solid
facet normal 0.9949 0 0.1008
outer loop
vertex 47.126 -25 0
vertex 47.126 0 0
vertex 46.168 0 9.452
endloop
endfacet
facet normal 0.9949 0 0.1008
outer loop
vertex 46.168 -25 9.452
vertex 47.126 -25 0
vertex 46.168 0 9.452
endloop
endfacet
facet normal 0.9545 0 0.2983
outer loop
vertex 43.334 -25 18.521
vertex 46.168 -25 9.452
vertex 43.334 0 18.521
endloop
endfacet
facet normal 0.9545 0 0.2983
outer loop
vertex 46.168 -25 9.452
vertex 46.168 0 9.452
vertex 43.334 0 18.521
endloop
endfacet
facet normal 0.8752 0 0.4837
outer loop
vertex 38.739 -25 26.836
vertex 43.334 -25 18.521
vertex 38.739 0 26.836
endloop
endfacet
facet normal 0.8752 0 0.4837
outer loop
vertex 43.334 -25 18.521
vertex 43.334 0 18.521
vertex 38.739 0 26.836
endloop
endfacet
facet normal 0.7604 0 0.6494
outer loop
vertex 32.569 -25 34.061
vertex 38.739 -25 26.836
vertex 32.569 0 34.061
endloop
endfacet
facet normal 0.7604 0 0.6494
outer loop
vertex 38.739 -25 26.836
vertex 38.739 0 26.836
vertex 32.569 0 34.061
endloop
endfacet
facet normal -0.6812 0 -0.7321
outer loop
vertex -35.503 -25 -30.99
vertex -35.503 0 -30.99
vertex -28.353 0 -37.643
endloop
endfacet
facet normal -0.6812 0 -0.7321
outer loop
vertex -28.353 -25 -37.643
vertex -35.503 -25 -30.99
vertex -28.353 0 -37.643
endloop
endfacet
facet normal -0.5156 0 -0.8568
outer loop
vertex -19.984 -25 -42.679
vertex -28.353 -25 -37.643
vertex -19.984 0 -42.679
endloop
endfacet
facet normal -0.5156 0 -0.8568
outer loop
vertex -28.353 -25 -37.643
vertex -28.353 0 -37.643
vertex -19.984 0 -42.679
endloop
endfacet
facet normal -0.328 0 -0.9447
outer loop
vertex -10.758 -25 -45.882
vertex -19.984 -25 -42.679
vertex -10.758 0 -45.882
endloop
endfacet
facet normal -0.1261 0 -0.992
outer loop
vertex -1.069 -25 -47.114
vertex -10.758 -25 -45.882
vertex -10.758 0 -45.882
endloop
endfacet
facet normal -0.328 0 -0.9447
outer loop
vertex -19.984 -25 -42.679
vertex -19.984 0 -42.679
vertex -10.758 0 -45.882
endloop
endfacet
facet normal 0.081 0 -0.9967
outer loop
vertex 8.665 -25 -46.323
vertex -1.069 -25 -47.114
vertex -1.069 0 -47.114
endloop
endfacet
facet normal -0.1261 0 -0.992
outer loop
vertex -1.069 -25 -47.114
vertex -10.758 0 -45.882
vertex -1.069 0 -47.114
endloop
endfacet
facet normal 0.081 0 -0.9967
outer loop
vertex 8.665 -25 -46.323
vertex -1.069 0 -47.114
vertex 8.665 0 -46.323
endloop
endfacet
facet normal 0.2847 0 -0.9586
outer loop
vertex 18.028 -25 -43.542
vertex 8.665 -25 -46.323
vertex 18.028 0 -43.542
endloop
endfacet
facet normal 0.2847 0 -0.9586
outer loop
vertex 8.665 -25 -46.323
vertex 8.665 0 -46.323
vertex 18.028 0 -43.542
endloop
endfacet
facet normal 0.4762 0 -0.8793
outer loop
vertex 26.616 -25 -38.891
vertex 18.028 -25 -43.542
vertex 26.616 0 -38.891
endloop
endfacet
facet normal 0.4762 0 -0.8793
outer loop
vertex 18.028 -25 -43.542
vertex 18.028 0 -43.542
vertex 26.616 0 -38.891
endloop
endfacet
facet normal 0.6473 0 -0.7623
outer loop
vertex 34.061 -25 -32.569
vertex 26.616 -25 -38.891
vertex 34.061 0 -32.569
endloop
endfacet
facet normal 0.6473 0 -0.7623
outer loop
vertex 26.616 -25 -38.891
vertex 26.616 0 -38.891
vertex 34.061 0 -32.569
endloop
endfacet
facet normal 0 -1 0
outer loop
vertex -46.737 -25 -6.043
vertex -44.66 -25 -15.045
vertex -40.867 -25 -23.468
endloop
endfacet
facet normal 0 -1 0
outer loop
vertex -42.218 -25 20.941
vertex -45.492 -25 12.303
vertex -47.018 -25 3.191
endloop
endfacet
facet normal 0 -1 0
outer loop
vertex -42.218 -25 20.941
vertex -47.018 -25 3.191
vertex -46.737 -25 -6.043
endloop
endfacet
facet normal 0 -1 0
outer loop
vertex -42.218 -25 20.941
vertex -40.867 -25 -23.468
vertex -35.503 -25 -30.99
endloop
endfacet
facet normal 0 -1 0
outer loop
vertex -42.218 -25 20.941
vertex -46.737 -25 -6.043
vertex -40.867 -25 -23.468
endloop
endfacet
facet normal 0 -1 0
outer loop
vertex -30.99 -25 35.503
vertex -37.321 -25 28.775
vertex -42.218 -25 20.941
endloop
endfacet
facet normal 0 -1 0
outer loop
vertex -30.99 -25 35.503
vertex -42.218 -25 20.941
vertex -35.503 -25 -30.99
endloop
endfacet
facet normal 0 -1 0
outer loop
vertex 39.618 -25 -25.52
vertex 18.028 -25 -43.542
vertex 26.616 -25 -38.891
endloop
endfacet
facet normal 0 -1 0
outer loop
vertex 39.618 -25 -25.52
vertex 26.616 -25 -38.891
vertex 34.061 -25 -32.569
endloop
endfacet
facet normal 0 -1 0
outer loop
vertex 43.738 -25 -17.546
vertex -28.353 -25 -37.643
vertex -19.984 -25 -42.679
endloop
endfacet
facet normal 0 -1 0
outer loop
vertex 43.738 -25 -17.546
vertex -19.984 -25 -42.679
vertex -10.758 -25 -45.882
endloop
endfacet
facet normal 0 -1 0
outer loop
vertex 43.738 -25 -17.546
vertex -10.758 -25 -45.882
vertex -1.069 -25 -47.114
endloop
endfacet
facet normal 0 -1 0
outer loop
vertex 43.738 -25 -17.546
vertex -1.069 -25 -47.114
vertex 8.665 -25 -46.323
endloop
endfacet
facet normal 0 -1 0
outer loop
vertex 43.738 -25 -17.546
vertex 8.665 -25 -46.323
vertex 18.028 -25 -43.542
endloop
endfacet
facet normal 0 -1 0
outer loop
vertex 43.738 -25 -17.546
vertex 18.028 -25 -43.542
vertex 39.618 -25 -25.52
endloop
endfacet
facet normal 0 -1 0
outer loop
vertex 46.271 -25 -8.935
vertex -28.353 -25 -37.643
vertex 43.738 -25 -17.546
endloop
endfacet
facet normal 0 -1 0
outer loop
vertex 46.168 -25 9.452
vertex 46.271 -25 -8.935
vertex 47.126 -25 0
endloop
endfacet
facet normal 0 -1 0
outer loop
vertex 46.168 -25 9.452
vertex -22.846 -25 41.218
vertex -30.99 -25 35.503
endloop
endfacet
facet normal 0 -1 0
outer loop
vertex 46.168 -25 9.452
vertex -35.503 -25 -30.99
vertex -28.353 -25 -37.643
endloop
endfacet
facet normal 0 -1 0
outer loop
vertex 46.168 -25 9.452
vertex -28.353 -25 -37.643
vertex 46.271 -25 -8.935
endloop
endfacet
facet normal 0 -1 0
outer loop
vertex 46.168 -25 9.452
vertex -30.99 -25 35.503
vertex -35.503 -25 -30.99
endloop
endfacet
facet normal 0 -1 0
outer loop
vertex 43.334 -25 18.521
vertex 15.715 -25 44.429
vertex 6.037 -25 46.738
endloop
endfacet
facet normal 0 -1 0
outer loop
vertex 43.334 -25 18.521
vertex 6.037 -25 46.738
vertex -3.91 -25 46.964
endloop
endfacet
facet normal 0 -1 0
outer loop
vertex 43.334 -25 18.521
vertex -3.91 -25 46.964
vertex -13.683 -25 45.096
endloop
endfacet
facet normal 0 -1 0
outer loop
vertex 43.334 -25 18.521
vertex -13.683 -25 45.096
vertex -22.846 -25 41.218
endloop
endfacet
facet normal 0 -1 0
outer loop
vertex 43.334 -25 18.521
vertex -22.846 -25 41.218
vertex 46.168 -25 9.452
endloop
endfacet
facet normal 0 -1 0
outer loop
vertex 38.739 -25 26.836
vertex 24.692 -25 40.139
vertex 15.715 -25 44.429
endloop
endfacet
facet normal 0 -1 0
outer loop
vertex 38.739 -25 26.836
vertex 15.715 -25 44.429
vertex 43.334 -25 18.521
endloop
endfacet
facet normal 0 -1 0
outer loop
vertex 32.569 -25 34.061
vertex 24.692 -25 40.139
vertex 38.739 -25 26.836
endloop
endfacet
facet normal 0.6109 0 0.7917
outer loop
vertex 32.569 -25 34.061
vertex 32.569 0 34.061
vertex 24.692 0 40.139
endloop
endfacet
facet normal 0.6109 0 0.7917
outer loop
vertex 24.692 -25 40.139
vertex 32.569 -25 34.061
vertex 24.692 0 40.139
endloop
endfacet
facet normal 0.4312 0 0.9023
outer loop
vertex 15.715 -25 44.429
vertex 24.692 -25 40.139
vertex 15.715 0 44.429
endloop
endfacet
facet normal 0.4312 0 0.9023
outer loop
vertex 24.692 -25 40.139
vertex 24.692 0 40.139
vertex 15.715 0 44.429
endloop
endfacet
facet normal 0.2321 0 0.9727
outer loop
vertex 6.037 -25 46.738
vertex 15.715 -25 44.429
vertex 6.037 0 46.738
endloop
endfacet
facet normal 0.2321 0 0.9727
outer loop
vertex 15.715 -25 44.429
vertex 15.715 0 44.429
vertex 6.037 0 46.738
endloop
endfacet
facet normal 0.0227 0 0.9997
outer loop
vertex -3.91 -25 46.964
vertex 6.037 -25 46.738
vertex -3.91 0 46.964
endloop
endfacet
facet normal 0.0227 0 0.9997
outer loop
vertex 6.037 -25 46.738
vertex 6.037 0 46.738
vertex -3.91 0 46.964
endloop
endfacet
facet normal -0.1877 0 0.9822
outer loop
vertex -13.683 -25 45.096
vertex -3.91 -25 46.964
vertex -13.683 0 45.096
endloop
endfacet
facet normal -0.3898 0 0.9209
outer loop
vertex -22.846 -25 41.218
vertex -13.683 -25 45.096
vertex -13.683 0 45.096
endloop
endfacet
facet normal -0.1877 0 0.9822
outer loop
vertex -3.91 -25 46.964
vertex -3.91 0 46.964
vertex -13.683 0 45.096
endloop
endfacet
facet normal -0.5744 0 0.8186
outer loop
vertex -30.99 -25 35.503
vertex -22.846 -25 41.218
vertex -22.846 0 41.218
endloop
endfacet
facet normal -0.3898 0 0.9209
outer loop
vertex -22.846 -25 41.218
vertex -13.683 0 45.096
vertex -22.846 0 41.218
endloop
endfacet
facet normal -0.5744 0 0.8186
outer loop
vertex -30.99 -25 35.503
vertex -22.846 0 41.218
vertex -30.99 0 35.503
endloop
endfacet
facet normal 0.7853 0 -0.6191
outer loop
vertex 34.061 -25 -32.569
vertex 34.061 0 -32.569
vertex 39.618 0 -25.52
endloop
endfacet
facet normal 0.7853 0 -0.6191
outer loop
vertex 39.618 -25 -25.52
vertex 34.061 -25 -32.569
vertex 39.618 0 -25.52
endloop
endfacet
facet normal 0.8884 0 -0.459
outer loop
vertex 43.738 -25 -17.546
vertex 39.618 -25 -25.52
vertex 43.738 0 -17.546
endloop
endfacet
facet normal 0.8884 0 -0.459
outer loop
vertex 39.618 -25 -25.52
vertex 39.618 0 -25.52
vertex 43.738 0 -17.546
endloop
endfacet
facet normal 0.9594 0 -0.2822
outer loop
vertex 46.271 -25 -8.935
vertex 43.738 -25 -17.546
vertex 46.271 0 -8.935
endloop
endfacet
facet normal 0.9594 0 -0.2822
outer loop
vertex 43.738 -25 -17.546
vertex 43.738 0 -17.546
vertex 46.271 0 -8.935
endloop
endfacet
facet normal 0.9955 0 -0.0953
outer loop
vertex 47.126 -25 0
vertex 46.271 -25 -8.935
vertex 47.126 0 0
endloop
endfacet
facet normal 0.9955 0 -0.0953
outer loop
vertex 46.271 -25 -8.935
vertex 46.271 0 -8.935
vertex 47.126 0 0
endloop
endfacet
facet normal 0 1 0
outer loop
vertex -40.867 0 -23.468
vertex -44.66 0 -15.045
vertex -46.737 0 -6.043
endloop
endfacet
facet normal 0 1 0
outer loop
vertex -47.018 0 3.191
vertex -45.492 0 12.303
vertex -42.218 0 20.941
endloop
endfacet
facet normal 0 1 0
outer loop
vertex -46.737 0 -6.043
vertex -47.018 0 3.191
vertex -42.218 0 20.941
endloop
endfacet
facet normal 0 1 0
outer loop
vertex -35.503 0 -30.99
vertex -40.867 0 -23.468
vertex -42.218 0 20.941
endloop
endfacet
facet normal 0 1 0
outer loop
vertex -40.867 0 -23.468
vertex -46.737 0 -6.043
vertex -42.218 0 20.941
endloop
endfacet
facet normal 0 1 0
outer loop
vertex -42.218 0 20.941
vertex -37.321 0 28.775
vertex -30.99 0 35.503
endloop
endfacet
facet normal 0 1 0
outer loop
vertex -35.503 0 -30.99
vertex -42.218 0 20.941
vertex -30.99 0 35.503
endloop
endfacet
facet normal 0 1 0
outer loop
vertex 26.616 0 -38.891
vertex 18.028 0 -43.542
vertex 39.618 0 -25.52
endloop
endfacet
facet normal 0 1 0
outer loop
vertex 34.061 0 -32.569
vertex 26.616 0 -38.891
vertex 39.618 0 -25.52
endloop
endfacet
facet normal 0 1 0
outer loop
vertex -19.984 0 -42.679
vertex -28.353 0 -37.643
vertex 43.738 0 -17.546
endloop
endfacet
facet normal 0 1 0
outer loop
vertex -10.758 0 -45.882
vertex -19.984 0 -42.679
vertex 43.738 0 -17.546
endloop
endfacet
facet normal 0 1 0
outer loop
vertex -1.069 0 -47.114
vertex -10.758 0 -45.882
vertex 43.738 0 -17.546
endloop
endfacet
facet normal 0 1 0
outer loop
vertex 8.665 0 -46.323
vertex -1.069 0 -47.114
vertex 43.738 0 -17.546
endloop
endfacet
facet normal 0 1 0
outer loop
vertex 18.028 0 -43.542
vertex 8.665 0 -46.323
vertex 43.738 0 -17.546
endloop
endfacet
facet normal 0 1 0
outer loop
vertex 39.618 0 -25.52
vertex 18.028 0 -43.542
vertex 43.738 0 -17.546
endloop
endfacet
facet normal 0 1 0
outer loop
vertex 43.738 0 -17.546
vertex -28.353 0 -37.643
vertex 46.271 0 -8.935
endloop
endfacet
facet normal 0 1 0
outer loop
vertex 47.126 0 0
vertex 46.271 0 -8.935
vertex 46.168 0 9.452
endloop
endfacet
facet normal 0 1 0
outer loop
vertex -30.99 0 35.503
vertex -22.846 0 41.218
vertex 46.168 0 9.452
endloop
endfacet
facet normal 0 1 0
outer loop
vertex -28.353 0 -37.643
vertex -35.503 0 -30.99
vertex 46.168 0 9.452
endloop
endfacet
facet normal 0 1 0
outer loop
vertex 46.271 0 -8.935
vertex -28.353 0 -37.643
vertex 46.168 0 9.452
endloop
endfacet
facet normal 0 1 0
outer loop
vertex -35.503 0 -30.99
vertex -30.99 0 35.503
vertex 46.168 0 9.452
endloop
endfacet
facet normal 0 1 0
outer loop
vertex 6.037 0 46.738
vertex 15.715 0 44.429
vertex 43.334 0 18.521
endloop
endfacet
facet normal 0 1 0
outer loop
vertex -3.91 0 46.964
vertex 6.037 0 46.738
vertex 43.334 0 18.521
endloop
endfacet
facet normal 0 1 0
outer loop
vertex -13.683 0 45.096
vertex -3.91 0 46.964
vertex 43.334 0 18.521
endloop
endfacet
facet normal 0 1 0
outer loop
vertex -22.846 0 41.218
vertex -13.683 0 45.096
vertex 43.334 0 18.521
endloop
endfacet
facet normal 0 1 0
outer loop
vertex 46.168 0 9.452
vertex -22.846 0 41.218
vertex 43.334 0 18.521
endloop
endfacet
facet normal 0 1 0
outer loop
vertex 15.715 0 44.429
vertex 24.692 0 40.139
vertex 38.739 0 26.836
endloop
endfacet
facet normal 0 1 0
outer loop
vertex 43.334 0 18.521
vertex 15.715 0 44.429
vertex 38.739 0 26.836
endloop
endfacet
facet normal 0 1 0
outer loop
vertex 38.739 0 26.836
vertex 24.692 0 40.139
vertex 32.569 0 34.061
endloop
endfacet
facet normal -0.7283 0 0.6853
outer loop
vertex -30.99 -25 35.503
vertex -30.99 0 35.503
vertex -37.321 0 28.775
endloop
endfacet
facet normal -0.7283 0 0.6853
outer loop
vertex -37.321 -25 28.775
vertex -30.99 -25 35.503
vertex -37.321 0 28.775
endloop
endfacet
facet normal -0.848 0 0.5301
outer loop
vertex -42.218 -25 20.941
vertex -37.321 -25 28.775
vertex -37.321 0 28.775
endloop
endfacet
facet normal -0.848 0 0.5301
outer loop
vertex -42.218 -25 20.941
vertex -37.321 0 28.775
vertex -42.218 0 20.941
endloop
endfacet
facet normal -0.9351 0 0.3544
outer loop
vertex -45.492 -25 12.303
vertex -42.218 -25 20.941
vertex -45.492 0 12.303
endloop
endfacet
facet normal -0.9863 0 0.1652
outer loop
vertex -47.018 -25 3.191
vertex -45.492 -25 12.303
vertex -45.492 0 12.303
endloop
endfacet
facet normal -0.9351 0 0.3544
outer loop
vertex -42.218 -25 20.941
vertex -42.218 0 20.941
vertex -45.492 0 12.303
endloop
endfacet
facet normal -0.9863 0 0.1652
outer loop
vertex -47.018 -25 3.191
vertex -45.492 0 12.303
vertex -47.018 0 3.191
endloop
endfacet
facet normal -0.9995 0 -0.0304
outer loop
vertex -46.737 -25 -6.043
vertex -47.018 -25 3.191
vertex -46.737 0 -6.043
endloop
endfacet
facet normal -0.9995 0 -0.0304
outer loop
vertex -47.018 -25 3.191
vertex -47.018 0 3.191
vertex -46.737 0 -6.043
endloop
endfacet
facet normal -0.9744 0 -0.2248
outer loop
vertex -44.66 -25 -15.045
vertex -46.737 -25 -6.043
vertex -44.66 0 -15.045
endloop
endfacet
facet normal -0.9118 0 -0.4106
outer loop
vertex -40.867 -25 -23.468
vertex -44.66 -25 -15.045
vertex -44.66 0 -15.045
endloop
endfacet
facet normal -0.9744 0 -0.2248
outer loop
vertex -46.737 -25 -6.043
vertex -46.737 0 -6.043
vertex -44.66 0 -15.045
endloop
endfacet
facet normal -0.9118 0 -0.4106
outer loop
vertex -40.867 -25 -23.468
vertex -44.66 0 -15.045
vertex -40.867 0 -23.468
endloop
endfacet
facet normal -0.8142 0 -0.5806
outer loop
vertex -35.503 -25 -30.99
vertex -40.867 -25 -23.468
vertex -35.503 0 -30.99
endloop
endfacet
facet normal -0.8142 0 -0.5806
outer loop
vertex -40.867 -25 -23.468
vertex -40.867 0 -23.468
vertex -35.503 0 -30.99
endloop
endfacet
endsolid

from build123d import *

# Parameters (mm, degrees)
F1_DEPTH = 25


with BuildPart() as f1:
    # F0 (on Front) → F1 (new body)
    with BuildSketch(Plane.XZ):
        with BuildLine():
            ThreePointArc((34.060664, -32.569028), (43.737952, -17.545993), (47.126111, 0))
            ThreePointArc((47.126111, 0), (43.334293, 18.520512), (32.569028, 34.060664))
            Line((32.569028, 34.060664), (0, 0))
            Line((0, 0), (34.060664, -32.569028))
        make_face()
        with BuildLine():
            Line((0, 0), (32.569028, 34.060664))
            ThreePointArc((32.569028, 34.060664), (1.069264, 47.113979), (-30.990258, 35.503158))
            Line((-30.990258, 35.503158), (0, 0))
        make_face()
        with BuildLine():
            ThreePointArc((-35.503158, -30.990258), (-1.069264, -47.113979), (34.060664, -32.569028))
            Line((34.060664, -32.569028), (0, 0))
            Line((0, 0), (-35.503158, -30.990258))
        make_face()
        with BuildLine():
            Line((0, 0), (-30.990258, 35.503158))
            ThreePointArc((-30.990258, 35.503158), (-47.017946, 3.191102), (-35.503158, -30.990258))
            Line((-35.503158, -30.990258), (0, 0))
        make_face()
    extrude(amount=F1_DEPTH)


solid = f1.part
